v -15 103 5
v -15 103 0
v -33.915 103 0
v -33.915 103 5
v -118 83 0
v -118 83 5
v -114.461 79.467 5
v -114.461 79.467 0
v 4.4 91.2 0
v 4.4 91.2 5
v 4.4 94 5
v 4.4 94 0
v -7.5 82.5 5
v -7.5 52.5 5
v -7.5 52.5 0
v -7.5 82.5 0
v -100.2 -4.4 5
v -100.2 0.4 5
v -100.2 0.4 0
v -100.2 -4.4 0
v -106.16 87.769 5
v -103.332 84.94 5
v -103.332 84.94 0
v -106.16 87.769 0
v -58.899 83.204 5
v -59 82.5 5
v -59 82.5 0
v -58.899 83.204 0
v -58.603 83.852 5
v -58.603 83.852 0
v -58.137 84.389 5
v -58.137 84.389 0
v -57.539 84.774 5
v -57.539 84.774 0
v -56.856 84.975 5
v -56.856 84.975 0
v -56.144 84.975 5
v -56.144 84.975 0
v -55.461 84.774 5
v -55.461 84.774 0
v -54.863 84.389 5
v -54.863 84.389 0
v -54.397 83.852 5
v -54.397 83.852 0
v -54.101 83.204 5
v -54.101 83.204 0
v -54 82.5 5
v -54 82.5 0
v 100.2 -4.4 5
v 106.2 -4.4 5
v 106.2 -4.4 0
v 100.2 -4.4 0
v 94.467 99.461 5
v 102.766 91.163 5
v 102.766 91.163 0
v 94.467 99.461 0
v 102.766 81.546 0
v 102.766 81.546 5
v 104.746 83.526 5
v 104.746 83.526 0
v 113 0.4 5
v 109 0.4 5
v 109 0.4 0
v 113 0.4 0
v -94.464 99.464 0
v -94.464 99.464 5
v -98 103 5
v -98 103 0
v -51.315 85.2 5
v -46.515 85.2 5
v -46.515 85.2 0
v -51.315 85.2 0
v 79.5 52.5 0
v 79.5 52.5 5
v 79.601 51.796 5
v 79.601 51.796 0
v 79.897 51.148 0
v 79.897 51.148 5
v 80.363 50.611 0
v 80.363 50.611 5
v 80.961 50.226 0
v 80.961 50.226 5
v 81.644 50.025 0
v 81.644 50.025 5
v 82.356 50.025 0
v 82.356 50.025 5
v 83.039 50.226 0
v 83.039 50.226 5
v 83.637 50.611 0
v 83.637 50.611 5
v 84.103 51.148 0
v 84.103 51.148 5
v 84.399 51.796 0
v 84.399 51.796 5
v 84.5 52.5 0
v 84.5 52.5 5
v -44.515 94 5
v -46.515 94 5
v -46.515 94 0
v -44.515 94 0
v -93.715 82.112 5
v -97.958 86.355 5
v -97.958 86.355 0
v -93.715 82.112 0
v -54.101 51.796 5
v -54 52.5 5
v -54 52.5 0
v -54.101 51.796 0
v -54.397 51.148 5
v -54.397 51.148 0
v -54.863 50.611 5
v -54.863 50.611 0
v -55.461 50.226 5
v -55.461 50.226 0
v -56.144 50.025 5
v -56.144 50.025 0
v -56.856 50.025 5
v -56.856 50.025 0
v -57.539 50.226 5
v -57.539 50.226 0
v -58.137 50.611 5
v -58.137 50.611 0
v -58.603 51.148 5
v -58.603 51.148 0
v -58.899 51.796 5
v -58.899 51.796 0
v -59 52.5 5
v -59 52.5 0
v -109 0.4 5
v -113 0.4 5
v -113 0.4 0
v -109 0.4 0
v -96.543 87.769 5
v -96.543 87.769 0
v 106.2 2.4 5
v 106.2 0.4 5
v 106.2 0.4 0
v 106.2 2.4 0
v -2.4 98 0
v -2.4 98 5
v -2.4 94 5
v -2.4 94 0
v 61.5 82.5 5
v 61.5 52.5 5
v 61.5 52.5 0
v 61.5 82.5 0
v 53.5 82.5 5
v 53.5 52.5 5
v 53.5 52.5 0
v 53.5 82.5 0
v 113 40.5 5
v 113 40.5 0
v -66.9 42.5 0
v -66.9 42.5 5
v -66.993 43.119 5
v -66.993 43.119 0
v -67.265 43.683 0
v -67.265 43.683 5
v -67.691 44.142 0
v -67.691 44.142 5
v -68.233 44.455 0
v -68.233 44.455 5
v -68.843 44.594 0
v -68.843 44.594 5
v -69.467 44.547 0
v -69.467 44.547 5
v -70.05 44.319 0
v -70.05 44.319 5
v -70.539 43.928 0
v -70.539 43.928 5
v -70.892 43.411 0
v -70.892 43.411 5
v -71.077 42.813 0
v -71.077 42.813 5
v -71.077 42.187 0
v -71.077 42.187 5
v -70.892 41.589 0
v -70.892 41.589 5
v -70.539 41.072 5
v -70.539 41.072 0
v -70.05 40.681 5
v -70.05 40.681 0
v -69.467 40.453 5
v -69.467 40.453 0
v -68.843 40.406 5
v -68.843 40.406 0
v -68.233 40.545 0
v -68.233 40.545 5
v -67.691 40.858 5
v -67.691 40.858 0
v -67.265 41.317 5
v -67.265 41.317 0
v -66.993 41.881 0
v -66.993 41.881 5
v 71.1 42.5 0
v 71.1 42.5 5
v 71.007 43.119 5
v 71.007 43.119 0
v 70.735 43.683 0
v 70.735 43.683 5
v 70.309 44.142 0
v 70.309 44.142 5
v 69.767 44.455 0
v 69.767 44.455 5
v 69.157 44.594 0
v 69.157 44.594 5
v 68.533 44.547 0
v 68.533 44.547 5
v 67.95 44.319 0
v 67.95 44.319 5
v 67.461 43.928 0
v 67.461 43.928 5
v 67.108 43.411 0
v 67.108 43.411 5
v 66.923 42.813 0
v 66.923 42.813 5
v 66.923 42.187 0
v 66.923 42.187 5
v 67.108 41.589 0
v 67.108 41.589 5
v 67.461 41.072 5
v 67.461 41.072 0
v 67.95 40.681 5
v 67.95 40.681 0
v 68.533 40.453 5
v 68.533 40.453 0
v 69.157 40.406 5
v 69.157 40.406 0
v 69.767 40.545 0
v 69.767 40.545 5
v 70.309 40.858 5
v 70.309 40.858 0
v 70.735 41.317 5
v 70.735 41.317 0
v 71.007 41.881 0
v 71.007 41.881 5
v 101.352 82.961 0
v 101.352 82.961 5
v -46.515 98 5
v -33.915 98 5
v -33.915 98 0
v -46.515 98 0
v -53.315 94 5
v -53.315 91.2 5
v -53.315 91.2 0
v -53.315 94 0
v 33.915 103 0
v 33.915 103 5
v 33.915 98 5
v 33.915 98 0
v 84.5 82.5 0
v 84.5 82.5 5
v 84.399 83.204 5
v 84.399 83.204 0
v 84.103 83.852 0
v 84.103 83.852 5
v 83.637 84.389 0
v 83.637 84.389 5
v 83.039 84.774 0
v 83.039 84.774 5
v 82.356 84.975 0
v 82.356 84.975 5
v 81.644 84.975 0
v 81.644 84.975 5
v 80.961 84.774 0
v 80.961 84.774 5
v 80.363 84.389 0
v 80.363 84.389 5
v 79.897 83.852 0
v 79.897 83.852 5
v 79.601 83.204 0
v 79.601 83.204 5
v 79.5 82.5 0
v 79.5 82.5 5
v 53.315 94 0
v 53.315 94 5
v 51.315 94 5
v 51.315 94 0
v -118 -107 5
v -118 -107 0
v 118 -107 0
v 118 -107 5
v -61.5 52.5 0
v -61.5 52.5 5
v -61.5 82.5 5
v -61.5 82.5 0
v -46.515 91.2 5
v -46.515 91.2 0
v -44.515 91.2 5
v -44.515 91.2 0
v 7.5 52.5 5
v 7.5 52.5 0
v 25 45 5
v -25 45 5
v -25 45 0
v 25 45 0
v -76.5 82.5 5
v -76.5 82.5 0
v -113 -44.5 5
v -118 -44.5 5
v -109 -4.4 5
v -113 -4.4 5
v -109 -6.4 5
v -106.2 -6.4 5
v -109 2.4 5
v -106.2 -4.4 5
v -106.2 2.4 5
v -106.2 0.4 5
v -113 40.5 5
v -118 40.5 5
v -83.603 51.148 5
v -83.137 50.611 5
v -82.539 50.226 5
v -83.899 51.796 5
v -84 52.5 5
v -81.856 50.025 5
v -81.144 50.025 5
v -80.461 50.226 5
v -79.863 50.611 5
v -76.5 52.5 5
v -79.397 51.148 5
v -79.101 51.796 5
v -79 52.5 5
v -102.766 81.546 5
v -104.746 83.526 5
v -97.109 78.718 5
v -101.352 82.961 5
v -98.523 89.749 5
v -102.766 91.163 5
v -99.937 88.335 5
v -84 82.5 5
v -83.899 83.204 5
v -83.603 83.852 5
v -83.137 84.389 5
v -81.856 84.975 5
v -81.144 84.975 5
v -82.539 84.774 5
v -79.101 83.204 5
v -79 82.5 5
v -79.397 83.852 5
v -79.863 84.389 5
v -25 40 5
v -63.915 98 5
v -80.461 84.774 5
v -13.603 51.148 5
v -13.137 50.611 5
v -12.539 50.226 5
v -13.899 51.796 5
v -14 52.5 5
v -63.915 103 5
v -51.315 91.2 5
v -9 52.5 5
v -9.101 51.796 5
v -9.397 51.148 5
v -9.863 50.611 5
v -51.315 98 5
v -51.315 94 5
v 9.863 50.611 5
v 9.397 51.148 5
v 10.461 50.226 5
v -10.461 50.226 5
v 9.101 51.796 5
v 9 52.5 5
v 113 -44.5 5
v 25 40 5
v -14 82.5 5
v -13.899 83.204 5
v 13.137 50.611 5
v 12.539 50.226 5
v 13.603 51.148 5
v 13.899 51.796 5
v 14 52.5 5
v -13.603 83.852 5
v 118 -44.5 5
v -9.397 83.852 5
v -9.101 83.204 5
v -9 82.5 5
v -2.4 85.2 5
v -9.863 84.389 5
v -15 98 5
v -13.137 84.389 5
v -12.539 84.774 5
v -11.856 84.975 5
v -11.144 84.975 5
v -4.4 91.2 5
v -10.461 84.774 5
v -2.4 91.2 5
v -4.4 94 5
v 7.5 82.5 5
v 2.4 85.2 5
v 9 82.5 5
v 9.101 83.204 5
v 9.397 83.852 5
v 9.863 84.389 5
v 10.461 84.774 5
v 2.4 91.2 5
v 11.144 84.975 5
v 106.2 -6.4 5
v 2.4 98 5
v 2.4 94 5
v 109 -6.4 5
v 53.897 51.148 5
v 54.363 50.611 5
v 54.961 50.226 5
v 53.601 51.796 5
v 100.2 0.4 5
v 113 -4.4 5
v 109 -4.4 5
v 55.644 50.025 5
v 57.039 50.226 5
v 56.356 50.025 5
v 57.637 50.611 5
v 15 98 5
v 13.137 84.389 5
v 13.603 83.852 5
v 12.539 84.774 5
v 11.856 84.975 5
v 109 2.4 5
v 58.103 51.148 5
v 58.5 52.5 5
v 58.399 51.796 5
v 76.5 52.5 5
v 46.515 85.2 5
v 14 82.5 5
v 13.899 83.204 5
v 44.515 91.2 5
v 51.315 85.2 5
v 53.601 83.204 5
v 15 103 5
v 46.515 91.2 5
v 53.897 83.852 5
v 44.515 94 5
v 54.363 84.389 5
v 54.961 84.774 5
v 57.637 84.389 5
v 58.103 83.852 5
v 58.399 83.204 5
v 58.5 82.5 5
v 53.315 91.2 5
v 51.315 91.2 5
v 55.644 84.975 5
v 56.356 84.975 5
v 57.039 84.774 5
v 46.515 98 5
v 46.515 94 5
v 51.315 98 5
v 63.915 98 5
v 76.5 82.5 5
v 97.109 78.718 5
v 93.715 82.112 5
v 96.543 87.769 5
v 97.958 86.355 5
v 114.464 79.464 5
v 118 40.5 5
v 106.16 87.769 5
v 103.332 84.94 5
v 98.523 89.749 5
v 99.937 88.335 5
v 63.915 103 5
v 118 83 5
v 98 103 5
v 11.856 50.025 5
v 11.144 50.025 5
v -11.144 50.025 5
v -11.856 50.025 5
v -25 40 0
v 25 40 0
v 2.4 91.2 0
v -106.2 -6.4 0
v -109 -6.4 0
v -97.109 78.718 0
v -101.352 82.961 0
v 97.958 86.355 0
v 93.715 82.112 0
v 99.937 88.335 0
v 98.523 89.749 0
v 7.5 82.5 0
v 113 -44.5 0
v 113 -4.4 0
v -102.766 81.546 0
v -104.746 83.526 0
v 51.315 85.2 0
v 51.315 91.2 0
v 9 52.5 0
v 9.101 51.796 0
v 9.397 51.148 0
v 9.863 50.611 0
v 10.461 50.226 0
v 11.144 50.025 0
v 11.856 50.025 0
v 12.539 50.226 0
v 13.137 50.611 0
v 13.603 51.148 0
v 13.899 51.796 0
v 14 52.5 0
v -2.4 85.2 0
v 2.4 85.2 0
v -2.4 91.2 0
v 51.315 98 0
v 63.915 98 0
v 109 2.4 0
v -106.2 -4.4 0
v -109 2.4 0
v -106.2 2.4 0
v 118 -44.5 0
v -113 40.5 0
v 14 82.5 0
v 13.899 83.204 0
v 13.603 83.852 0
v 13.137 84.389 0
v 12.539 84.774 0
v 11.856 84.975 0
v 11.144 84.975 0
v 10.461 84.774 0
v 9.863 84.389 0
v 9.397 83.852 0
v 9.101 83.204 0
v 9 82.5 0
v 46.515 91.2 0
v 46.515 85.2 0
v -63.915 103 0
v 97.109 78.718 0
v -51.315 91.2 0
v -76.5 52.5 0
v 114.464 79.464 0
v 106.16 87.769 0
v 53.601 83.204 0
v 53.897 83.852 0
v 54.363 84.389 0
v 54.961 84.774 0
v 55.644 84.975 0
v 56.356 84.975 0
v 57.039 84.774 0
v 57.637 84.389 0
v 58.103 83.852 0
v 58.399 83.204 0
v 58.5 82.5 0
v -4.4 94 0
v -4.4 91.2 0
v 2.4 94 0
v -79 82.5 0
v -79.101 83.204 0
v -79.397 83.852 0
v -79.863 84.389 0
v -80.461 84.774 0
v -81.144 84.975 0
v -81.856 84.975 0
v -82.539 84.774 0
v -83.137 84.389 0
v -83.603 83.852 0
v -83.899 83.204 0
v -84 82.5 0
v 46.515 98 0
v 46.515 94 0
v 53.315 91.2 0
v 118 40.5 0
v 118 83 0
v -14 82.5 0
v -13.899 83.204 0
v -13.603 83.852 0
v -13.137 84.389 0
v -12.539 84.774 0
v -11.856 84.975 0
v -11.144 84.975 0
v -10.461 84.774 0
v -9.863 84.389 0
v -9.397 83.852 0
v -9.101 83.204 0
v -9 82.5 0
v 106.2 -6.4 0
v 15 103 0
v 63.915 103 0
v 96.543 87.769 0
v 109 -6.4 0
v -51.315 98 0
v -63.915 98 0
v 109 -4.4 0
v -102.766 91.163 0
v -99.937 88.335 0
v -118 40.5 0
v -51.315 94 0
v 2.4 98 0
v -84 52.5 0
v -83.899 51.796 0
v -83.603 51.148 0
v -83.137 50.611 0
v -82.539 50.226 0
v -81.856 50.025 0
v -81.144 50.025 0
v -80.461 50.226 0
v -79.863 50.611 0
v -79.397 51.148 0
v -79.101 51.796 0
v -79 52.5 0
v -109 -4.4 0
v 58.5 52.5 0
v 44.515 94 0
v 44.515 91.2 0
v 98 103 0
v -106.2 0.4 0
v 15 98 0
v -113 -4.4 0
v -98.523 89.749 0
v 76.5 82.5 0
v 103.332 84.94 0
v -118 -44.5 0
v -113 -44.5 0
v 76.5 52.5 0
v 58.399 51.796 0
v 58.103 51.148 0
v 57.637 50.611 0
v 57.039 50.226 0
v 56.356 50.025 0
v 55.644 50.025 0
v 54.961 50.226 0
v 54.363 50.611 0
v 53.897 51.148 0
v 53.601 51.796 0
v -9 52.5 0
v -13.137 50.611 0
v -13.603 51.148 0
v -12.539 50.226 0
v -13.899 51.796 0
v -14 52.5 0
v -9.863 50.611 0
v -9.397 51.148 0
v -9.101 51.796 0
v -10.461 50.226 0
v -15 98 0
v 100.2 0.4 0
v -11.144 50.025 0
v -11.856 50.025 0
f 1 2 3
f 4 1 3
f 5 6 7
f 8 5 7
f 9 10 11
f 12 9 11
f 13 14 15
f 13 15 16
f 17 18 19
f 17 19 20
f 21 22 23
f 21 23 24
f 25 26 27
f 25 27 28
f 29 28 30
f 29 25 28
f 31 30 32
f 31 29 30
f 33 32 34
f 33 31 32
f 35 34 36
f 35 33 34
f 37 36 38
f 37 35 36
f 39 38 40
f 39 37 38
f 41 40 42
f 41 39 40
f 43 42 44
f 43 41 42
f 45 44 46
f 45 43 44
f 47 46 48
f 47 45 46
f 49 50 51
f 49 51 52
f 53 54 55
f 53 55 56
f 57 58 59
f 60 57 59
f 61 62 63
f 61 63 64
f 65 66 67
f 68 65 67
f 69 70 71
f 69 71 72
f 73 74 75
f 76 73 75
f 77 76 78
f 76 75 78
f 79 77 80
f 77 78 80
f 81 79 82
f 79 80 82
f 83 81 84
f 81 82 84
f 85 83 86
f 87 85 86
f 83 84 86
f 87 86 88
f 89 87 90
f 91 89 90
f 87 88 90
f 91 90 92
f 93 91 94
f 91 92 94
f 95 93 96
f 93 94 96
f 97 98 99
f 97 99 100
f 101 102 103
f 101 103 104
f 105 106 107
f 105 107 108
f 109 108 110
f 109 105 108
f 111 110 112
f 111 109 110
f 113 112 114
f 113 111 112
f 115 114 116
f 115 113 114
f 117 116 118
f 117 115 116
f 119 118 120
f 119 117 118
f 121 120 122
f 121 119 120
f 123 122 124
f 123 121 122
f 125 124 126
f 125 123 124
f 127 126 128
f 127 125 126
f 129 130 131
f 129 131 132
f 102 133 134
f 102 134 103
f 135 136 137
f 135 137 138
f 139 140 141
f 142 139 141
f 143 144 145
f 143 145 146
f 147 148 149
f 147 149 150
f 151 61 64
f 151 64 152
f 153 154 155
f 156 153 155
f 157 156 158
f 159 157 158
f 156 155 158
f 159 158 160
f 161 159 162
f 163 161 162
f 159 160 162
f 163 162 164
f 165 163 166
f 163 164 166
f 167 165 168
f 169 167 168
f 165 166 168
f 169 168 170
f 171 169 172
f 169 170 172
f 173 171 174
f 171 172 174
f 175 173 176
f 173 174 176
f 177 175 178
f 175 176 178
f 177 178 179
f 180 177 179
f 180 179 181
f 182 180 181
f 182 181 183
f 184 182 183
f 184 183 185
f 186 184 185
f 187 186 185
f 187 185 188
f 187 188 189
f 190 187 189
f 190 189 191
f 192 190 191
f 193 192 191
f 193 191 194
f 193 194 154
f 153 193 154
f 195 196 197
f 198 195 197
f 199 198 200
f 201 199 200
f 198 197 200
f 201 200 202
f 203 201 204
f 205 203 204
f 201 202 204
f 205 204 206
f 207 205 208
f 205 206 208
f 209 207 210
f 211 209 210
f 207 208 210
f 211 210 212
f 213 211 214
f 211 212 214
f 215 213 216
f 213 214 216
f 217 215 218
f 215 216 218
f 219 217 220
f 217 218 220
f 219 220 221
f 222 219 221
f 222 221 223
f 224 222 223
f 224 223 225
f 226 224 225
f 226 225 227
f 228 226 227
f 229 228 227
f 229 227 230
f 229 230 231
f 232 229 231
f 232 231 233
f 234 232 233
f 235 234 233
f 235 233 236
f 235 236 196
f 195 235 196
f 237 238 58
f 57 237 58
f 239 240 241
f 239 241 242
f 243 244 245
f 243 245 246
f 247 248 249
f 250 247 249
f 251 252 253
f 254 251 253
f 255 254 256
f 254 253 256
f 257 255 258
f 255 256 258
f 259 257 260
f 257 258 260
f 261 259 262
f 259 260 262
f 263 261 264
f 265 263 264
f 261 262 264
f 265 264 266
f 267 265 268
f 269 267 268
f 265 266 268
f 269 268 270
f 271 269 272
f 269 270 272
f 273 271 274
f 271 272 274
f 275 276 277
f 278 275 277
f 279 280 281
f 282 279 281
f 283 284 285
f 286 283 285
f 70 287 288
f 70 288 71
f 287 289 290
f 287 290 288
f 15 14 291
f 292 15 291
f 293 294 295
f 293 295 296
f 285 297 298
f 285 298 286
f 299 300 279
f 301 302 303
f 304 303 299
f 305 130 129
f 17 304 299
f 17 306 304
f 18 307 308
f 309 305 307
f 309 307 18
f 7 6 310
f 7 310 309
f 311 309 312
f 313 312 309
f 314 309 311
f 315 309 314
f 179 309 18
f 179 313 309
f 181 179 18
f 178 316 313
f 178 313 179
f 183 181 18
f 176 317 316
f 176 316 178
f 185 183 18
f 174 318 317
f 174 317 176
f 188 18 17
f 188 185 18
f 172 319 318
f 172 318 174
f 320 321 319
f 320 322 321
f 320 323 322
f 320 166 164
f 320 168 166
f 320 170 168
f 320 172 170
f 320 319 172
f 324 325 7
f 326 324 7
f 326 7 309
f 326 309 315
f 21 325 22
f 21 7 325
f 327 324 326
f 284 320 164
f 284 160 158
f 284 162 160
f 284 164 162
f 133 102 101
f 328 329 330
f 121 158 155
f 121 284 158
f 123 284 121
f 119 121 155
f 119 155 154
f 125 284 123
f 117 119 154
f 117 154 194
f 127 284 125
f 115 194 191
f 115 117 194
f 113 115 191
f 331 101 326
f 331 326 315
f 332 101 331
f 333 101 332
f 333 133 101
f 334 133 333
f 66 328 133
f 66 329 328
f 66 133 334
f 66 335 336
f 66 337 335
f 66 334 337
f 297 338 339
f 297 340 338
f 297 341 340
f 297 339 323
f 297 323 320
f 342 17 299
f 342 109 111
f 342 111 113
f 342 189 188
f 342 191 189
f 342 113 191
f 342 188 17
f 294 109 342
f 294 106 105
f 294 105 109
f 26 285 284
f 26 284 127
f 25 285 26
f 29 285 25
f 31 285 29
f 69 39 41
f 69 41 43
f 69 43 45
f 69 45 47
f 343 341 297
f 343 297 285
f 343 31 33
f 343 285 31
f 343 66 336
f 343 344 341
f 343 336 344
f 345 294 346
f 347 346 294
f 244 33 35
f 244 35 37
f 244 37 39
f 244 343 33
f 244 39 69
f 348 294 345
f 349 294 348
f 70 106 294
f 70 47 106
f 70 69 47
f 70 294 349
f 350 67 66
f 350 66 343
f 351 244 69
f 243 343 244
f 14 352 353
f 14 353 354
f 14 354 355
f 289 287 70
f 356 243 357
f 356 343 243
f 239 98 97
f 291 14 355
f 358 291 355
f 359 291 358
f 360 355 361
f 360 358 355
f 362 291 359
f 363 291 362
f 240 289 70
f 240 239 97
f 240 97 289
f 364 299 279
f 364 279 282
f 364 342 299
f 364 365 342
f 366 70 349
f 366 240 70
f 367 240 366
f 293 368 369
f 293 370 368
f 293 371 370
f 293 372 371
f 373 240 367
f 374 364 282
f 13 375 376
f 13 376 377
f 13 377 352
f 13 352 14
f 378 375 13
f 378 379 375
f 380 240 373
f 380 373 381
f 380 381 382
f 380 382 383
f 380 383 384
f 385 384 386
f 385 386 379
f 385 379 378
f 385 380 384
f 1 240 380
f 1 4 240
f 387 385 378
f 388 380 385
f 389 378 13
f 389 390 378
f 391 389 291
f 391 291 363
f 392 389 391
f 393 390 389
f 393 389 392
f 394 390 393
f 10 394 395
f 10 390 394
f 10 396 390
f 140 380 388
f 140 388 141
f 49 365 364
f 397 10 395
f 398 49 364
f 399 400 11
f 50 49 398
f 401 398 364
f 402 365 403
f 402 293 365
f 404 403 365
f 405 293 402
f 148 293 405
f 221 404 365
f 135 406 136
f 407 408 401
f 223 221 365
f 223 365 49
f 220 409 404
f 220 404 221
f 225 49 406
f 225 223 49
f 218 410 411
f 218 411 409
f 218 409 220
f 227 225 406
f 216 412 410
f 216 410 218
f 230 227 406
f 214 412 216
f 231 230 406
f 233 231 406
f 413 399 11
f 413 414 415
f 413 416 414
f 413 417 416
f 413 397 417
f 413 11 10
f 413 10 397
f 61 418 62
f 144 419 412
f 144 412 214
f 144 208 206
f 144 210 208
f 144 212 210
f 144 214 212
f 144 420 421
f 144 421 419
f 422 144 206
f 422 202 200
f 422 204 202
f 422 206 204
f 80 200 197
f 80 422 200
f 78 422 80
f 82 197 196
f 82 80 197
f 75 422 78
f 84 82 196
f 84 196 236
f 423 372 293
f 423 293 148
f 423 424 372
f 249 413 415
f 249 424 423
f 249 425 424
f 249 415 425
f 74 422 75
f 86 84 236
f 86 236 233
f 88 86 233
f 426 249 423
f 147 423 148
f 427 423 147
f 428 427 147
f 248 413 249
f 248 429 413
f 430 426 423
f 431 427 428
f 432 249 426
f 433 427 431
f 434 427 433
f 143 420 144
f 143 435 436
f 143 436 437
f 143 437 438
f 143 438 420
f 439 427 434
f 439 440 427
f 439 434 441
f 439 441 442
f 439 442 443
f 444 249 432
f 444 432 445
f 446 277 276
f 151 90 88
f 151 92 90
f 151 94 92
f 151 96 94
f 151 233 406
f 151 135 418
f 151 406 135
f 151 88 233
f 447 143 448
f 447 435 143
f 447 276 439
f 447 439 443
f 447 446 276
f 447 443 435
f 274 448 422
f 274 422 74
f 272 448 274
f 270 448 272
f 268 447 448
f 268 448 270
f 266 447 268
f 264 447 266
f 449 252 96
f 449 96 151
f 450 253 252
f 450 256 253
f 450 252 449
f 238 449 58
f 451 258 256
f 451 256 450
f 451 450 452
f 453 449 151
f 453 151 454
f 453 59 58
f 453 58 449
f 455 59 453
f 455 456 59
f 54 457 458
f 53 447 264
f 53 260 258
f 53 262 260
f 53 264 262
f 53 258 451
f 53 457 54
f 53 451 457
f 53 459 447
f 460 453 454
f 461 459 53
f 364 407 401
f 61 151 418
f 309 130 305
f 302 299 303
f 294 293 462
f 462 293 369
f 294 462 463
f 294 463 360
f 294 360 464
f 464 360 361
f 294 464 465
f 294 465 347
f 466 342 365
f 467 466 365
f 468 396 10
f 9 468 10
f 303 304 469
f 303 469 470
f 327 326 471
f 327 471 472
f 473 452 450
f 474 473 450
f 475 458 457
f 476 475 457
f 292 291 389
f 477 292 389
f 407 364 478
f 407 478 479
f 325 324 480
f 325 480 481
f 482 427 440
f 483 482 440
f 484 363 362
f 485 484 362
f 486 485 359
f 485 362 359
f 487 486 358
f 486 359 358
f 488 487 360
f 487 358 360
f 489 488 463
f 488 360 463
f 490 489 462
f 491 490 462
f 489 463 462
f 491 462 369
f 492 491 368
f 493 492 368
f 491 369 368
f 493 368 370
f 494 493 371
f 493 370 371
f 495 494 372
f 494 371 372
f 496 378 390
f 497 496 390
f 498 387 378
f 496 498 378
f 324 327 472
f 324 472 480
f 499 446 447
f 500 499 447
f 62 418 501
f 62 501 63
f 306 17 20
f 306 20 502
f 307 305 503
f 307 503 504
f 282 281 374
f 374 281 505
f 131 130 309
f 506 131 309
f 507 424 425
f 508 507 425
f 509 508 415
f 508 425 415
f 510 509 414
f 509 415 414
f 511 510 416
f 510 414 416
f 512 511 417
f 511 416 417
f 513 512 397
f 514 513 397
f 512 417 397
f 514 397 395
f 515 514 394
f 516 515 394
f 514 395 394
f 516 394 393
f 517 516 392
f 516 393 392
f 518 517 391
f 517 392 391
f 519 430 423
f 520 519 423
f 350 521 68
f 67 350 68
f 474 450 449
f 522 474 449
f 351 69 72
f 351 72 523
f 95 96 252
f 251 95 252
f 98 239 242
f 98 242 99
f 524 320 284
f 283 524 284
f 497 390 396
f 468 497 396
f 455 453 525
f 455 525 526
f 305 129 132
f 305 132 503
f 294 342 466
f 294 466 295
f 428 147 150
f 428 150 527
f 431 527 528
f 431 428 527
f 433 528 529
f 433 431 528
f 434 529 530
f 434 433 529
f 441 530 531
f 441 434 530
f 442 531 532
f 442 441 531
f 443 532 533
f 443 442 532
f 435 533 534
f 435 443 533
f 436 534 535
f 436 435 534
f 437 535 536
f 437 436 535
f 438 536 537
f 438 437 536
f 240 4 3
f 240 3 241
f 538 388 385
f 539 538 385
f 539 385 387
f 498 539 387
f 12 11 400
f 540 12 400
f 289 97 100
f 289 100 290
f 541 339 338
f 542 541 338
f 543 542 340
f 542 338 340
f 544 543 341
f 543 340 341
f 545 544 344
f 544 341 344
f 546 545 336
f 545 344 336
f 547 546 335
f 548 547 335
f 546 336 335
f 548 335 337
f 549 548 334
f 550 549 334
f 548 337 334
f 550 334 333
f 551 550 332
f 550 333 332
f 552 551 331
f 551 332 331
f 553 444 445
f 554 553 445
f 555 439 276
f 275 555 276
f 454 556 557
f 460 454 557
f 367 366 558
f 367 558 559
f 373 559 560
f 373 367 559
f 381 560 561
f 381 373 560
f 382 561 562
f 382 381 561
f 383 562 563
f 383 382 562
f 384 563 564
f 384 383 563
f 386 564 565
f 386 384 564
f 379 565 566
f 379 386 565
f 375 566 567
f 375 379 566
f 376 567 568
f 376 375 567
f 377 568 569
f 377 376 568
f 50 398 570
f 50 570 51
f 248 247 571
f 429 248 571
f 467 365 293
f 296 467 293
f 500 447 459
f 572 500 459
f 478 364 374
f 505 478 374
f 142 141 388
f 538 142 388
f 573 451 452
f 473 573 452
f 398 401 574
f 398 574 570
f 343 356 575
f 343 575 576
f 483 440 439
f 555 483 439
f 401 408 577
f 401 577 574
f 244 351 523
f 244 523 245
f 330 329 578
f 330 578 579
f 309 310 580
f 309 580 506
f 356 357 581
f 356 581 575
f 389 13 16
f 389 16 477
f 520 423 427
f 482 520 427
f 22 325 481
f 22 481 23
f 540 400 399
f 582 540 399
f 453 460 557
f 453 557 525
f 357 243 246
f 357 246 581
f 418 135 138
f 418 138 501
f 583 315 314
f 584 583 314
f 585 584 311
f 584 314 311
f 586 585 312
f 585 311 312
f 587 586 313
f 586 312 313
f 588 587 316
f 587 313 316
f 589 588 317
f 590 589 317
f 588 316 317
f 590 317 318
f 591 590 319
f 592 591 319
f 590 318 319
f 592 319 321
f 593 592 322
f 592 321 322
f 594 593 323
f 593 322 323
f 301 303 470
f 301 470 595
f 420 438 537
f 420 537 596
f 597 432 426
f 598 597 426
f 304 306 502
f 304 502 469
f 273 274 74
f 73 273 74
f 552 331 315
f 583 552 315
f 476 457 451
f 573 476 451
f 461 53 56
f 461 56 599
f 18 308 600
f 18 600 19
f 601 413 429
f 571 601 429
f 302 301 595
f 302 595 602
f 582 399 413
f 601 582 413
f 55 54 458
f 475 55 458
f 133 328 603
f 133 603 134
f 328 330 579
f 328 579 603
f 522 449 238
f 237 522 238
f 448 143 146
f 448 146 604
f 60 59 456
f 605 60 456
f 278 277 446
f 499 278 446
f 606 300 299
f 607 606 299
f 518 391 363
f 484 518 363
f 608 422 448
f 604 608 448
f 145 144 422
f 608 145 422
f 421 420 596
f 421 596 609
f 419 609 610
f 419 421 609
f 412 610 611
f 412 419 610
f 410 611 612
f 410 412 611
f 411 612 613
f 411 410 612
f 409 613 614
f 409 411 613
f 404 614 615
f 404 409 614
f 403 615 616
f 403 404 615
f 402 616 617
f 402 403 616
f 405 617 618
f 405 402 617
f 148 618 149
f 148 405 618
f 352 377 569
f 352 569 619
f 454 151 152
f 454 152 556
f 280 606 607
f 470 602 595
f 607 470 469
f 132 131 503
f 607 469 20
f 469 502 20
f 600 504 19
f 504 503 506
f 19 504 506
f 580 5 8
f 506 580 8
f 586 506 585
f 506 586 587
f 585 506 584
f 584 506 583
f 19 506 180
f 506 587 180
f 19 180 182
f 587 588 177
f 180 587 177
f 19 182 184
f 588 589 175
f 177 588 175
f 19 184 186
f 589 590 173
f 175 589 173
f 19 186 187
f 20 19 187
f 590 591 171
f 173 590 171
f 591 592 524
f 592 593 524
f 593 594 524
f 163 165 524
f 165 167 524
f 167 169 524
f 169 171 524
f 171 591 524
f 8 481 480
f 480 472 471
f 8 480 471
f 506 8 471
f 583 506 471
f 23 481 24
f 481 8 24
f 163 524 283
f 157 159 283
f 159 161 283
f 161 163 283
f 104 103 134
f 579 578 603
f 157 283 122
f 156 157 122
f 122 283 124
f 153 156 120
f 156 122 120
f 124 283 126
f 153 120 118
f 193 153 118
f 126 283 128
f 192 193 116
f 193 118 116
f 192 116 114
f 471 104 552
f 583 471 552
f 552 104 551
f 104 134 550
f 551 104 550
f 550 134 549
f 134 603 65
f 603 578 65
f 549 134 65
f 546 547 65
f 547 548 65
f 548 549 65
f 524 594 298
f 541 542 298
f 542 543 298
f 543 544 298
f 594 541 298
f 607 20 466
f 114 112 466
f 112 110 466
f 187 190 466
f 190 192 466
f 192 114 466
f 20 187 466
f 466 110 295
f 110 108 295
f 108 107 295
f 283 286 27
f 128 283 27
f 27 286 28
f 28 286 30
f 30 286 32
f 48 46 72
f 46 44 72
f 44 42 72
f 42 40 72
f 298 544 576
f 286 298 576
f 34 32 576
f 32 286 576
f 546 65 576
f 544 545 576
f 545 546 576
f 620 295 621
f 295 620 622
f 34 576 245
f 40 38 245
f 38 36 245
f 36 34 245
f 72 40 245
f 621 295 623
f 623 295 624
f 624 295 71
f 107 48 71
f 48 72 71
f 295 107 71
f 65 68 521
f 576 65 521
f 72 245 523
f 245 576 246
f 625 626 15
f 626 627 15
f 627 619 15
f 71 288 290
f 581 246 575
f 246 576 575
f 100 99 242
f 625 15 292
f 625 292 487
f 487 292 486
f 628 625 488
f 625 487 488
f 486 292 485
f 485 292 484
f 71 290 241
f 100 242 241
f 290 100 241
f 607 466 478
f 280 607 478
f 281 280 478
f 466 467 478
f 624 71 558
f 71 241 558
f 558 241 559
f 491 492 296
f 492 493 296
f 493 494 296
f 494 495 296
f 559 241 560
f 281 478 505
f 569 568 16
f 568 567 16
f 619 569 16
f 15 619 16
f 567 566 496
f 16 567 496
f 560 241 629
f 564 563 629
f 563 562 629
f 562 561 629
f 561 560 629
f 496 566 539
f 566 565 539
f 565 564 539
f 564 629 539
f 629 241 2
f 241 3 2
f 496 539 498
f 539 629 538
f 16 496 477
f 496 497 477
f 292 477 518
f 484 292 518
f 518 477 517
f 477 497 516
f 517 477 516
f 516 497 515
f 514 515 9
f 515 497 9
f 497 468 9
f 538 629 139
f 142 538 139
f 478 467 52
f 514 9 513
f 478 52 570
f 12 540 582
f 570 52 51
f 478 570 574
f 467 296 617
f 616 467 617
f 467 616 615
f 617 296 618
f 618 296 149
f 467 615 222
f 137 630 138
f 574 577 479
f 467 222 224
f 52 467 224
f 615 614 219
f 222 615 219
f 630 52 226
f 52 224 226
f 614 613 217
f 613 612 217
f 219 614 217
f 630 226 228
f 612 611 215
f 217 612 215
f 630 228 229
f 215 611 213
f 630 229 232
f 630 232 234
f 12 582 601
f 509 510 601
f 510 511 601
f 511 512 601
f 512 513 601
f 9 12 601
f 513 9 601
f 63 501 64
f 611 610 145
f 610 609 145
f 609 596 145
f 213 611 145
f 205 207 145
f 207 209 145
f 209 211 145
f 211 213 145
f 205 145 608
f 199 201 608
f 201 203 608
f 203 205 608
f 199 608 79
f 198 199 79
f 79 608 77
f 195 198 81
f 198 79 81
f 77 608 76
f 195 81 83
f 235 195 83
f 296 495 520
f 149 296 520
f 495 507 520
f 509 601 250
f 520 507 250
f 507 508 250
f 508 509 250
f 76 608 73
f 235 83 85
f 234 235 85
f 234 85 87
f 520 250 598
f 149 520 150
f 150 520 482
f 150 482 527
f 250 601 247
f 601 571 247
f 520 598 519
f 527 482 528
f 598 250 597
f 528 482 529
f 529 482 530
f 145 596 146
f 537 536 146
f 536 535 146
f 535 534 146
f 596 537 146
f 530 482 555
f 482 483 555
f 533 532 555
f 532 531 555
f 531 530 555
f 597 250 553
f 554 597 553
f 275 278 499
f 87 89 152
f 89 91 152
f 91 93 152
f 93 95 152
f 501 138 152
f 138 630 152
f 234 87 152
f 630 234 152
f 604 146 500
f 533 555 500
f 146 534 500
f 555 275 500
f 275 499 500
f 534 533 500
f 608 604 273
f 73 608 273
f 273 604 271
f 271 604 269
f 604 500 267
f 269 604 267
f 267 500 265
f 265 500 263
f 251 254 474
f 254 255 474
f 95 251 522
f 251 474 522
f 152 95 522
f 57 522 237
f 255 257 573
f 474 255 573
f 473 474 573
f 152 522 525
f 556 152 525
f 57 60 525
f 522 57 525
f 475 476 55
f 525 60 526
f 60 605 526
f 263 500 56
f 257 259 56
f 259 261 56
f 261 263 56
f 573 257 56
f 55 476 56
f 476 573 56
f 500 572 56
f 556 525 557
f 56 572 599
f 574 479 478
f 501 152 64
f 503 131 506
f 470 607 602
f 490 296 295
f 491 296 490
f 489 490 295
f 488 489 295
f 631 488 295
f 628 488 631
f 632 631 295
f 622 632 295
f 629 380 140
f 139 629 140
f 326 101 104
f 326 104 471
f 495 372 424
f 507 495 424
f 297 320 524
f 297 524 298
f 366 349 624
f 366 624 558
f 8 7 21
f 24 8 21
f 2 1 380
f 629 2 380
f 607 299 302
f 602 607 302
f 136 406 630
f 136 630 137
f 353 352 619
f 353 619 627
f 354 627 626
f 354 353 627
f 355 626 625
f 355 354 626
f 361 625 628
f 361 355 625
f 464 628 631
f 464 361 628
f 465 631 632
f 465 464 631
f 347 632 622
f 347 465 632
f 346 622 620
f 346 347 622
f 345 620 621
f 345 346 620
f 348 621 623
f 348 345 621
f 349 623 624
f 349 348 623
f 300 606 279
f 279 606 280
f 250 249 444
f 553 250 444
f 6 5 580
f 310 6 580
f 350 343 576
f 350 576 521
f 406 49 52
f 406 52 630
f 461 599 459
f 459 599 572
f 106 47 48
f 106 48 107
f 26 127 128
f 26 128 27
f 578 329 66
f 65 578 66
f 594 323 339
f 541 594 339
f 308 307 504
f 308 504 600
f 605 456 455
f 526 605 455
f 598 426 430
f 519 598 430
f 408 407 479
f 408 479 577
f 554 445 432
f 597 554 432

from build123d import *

# Parameters (mm, degrees)
BOSS_EXTRUDE1_DEPTH = 5
SKETCH4_W           = 5
SKETCH4_H           = 85
CUT_EXTRUDE3_DEPTH  = 6
CUT_EXTRUDE6_DEPTH  = 6
CUT_EXTRUDE8_DEPTH  = 5
SKETCH10_R          = 2.1
SKETCH10_W          = 50
SKETCH10_H          = 5
SKETCH10_W_2        = 15
SKETCH10_H_2        = 30
CUT_EXTRUDE9_DEPTH  = 10
CUT_EXTRUDE10_DEPTH = 10


with BuildPart() as part:
    # Sketch1 → Boss-Extrude1 (new body)
    with BuildSketch(Plane.XY):
        Polygon((64.226162893, -107), (118, -107), (118, 83), (98, 103), (-98, 103), (-118, 83), (-118, -107), (-64.226162893, -107), align=None)
    extrude(amount=BOSS_EXTRUDE1_DEPTH)

    # Sketch4 → Cut-Extrude3 (cut, through all)
    with BuildSketch(Plane.XY.offset(5)):
        with Locations((-115.5, -2)):
            Rectangle(SKETCH4_W, SKETCH4_H)
        with Locations((115.5, -2)):
            Rectangle(SKETCH4_W, SKETCH4_H)
    extrude(amount=-CUT_EXTRUDE3_DEPTH, mode=Mode.SUBTRACT)

    # Sketch7 → Cut-Extrude6 (cut, through all)
    with BuildSketch(Plane.XY.offset(5)):
        Polygon((-15, 98), (-2.4, 98), (-2.4, 94), (-4.4, 94), (-4.4, 91.2), (-2.4, 91.2), (-2.4, 85.2), (2.4, 85.2), (2.4, 91.2), (4.4, 91.2), (4.4, 94), (2.4, 94), (2.4, 98), (15, 98), (15, 103), (-15, 103), align=None)
        Polygon((-51.315063509, 98), (-63.915063509, 98), (-63.915063509, 103), (-33.915063509, 103), (-33.915063509, 98), (-46.515063509, 98), (-46.515063509, 94), (-44.515063509, 94), (-44.515063509, 91.2), (-46.515063509, 91.2), (-46.515063509, 85.2), (-51.315063509, 85.2), (-51.315063509, 91.2), (-53.315063509, 91.2), (-53.315063509, 94), (-51.315063509, 94), align=None)
        Polygon((-102.765899705, 91.163032483), (-99.93747258, 88.334605358), (-98.523259018, 89.748818921), (-96.543360031, 87.768919933), (-97.957573593, 86.354706371), (-93.714932906, 82.112065684), (-97.109045456, 78.717953134), (-101.351686143, 82.960593821), (-102.765899705, 81.546380259), (-104.745798693, 83.526279246), (-103.33158513, 84.940492808), (-106.160012255, 87.768919933), align=None)
        Polygon((93.714932906, 82.112065684), (97.109045456, 78.717953134), (101.351686143, 82.960593821), (102.765899705, 81.546380259), (104.745798693, 83.526279246), (103.33158513, 84.940492808), (106.160012255, 87.768919933), (102.765899705, 91.163032483), (99.93747258, 88.334605358), (98.523259018, 89.748818921), (96.543360031, 87.768919933), (97.957573593, 86.354706371), align=None)
        Polygon((33.915063509, 98), (46.515063509, 98), (46.515063509, 94), (44.515063509, 94), (44.515063509, 91.2), (46.515063509, 91.2), (46.515063509, 85.2), (51.315063509, 85.2), (51.315063509, 91.2), (53.315063509, 91.2), (53.315063509, 94), (51.315063509, 94), (51.315063509, 98), (63.915063509, 98), (63.915063509, 103), (33.915063509, 103), align=None)
    extrude(amount=-CUT_EXTRUDE6_DEPTH, mode=Mode.SUBTRACT)

    # Sketch9 → Cut-Extrude8 (cut)
    with BuildSketch(Plane.XY.offset(5)):
        Polygon((94.467486322, 99.461445866), (98, 103), (118, 83), (114.464466094, 79.464466094), align=None)
        Polygon((-118, 83), (-114.461445866, 79.467486322), (-94.464466094, 99.464466094), (-98, 103), align=None)
    extrude(amount=-CUT_EXTRUDE8_DEPTH, mode=Mode.SUBTRACT)

    # Sketch10 → Cut-Extrude9 (cut)
    with BuildSketch(Plane.XY.offset(5)):
        with Locations((69, 42.5)):
            Circle(SKETCH10_R)
        with Locations((-69, 42.5)):
            Circle(SKETCH10_R)
        with Locations((0, 42.5)):
            Rectangle(SKETCH10_W, SKETCH10_H)
        with Locations((-69, 67.5)):
            Rectangle(SKETCH10_W_2, SKETCH10_H_2)
        with Locations((0, 67.5)):
            Rectangle(SKETCH10_W_2, SKETCH10_H_2)
        with Locations((69, 67.5)):
            Rectangle(SKETCH10_W_2, SKETCH10_H_2)
        with BuildLine():
            Line((-54, 82.5), (-54, 52.5))
            ThreePointArc((-54, 52.5), (-56.5, 50), (-59, 52.5))
            Line((-59, 52.5), (-59, 82.5))
            ThreePointArc((-59, 82.5), (-56.5, 85), (-54, 82.5))
        make_face()
        with BuildLine():
            Line((-9, 82.5), (-9, 52.5))
            ThreePointArc((-9, 52.5), (-11.5, 50), (-14, 52.5))
            Line((-14, 52.5), (-14, 82.5))
            ThreePointArc((-14, 82.5), (-11.5, 85), (-9, 82.5))
        make_face()
        with BuildLine():
            Line((58.5, 82.5), (58.5, 52.5))
            ThreePointArc((58.5, 52.5), (56, 50), (53.5, 52.5))
            Line((53.5, 52.5), (53.5, 82.5))
            ThreePointArc((53.5, 82.5), (56, 85), (58.5, 82.5))
        make_face()
        with BuildLine():
            Line((-84, 82.5), (-84, 52.5))
            ThreePointArc((-84, 52.5), (-81.5, 50), (-79, 52.5))
            Line((-79, 52.5), (-79, 82.5))
            ThreePointArc((-79, 82.5), (-81.5, 85), (-84, 82.5))
        make_face()
        with BuildLine():
            Line((9, 82.5), (9, 52.5))
            ThreePointArc((9, 52.5), (11.5, 50), (14, 52.5))
            Line((14, 52.5), (14, 82.5))
            ThreePointArc((14, 82.5), (11.5, 85), (9, 82.5))
        make_face()
        with BuildLine():
            Line((79.5, 82.5), (79.5, 52.5))
            ThreePointArc((79.5, 52.5), (82, 50), (84.5, 52.5))
            Line((84.5, 52.5), (84.5, 82.5))
            ThreePointArc((84.5, 82.5), (82, 85), (79.5, 82.5))
        make_face()
    extrude(amount=-CUT_EXTRUDE9_DEPTH, mode=Mode.SUBTRACT)

    # Sketch11 → Cut-Extrude10 (cut)
    with BuildSketch(Plane.XY.offset(5)):
        Polygon((-113, 0.4), (-109, 0.4), (-109, 2.4), (-106.2, 2.4), (-106.2, 0.4), (-100.2, 0.4), (-100.2, -4.4), (-106.2, -4.4), (-106.2, -6.4), (-109, -6.4), (-109, -4.4), (-113, -4.4), align=None)
        Polygon((113, 0.4), (113, -4.4), (109, -4.4), (109, -6.4), (106.2, -6.4), (106.2, -4.4), (100.2, -4.4), (100.2, 0.4), (106.2, 0.4), (106.2, 2.4), (109, 2.4), (109, 0.4), align=None)
    extrude(amount=-CUT_EXTRUDE10_DEPTH, mode=Mode.SUBTRACT)


solid = part.part
